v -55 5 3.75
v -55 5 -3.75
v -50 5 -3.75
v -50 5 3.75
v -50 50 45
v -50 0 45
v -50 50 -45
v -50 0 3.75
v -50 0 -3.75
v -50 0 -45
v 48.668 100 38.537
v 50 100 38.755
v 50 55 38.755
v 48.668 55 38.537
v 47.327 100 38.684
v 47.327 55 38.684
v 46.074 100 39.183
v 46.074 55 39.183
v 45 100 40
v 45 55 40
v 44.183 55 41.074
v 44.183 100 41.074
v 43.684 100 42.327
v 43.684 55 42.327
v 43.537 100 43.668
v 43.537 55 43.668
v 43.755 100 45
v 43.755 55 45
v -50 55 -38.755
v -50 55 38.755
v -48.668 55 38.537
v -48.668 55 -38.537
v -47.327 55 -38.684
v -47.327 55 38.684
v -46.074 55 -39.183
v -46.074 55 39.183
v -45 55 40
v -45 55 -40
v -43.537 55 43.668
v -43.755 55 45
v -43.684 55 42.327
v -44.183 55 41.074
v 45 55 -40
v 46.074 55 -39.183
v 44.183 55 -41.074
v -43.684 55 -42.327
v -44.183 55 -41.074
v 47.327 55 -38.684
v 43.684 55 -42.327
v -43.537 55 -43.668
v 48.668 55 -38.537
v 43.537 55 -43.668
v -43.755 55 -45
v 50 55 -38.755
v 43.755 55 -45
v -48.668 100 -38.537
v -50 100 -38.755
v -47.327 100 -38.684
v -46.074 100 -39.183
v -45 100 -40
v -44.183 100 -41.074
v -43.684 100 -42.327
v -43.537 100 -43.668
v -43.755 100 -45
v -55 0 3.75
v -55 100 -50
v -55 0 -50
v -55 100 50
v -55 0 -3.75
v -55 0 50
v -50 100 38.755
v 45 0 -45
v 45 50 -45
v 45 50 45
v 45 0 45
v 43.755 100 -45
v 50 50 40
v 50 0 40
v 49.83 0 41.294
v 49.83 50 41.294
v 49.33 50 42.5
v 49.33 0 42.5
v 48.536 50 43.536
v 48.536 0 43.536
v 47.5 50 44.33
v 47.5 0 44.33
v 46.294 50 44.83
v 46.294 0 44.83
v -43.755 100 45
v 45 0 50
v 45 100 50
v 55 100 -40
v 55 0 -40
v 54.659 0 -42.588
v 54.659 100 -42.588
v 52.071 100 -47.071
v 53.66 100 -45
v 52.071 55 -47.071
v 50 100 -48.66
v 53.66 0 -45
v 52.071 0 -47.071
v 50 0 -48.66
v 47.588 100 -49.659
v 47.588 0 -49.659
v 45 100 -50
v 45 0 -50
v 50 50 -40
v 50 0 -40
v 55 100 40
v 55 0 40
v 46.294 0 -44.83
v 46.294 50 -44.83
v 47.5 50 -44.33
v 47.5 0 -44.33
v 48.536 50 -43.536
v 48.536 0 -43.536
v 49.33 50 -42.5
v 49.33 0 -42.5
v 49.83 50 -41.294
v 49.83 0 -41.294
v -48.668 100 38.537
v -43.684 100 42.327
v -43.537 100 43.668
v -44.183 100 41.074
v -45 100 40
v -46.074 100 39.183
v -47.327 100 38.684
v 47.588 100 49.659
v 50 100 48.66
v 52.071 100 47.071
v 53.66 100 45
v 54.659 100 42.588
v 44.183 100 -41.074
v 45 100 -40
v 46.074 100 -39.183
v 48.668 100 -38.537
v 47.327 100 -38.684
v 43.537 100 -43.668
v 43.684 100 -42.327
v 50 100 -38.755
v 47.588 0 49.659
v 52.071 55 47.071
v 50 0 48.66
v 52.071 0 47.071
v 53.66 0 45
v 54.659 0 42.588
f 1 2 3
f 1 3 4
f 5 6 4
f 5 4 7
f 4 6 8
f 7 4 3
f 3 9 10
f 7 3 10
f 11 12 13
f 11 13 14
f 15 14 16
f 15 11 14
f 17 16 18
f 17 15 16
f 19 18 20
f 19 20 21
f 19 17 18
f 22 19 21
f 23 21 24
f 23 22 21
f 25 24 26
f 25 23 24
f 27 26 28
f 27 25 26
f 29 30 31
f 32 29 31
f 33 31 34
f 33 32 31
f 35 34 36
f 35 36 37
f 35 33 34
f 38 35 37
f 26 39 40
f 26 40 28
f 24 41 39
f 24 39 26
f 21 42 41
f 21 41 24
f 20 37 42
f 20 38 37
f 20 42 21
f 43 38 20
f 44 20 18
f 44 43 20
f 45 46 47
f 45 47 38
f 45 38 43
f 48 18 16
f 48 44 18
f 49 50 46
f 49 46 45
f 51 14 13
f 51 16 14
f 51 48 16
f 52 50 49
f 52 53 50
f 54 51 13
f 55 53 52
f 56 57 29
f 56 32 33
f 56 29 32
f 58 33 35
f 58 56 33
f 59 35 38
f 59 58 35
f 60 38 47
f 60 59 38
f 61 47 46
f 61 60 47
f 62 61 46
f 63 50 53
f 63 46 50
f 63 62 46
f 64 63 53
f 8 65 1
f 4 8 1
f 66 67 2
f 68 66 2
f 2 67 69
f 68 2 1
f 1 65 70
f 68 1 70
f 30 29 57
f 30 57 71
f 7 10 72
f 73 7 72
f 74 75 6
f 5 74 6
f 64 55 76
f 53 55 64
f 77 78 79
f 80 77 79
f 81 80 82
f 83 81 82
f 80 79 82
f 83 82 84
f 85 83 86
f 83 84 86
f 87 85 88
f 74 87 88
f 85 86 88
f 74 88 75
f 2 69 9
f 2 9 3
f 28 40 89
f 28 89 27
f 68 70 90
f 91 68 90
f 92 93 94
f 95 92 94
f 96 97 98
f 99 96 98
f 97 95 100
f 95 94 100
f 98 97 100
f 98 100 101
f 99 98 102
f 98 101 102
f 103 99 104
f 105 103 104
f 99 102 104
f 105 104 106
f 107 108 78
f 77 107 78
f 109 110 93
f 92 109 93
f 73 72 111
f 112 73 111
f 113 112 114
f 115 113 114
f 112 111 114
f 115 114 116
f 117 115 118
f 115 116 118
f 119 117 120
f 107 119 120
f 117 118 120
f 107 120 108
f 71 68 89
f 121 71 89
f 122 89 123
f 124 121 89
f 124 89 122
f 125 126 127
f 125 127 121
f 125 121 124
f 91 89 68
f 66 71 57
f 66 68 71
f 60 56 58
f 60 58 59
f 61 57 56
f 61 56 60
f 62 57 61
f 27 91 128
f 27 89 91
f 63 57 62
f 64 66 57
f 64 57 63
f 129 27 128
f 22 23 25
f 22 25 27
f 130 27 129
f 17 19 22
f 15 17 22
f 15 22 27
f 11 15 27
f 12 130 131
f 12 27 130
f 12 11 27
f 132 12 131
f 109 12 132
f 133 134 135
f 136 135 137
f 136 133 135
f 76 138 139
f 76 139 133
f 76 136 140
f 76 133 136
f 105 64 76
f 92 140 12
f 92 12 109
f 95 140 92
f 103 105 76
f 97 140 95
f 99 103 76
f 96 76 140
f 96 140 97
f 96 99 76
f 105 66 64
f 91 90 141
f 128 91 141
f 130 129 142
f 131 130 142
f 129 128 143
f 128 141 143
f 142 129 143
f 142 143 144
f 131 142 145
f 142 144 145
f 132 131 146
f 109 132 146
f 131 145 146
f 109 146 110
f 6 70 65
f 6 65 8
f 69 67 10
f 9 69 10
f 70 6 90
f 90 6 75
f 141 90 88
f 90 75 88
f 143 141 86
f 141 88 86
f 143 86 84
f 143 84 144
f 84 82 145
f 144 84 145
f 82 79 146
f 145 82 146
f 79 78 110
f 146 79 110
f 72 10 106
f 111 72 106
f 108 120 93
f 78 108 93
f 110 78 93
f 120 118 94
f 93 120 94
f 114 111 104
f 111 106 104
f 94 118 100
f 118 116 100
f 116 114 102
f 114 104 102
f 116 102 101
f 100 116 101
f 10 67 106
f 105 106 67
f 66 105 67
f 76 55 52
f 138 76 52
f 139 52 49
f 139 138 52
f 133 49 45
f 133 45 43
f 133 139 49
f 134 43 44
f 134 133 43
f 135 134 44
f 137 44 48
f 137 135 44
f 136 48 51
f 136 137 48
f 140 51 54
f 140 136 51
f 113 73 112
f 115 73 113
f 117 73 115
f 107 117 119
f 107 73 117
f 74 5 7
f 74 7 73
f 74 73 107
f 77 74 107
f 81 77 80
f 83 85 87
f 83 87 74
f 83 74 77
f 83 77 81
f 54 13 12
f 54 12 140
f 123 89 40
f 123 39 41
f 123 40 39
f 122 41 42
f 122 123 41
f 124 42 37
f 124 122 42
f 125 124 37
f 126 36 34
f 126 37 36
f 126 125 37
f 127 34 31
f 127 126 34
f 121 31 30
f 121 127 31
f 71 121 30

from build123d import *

# Parameters (mm, degrees)
BOSS_EXTRUDE1_DEPTH = 100
CUT_EXTRUDE1_DEPTH  = 50
CUT_EXTRUDE2_START  = -45
CUT_EXTRUDE2_DEPTH  = 45
SKETCH4_R           = 5
BOSS_EXTRUDE2_DEPTH = 45
SKETCH5_W           = 7.5
SKETCH5_H           = 5
CUT_EXTRUDE4_DEPTH  = 5


with BuildPart() as part:
    # Sketch1 → Boss-Extrude1 (new body)
    with BuildSketch(Plane(origin=(0, 0, 0), x_dir=(1, 0, 0), z_dir=(0, 1, 0))):
        with BuildLine():
            Line((-55, -50), (45, -50))
            ThreePointArc((45, -50), (52.071067812, -47.071067812), (55, -40))
            Line((55, -40), (55, 40))
            ThreePointArc((55, 40), (52.071067812, 47.071067812), (45, 50))
            Line((45, 50), (-55, 50))
            Line((-55, 50), (-55, -50))
        make_face()
    extrude(amount=BOSS_EXTRUDE1_DEPTH)

    # Sketch2 → Cut-Extrude1 (cut)
    with BuildSketch(Plane.XZ):
        with BuildLine():
            Line((-50, 45), (-50, -45))
            Line((-50, -45), (45, -45))
            ThreePointArc((45, -45), (48.535533906, -43.535533906), (50, -40))
            Line((50, -40), (50, 40))
            ThreePointArc((50, 40), (48.535533906, 43.535533906), (45, 45))
            Line((45, 45), (-50, 45))
        make_face()
    extrude(amount=-CUT_EXTRUDE1_DEPTH, mode=Mode.SUBTRACT)

    # Sketch3 → Cut-Extrude2 (cut)
    with BuildSketch(Plane(origin=(0, 100, 0), x_dir=(1, 0, 0), z_dir=(0, 1, 0)).offset(CUT_EXTRUDE2_START)):
        with BuildLine():
            Line((-50, 45), (-50, -45))
            Line((-50, -45), (45, -45))
            ThreePointArc((45, -45), (48.535533906, -43.535533906), (50, -40))
            Line((50, -40), (50, 40))
            ThreePointArc((50, 40), (48.535533906, 43.535533906), (45, 45))
            Line((45, 45), (-50, 45))
        make_face()
    extrude(amount=CUT_EXTRUDE2_DEPTH, mode=Mode.SUBTRACT)

    # Sketch4 → Boss-Extrude2 (add)
    with BuildSketch(Plane(origin=(0, 100, 0), x_dir=(1, 0, 0), z_dir=(0, 1, 0))):
        with Locations((48.535533906, -43.535533906)):
            Circle(SKETCH4_R)
        with Locations((48.535533906, 43.535533906)):
            Circle(SKETCH4_R)
        with Locations((-48.535533906, -43.535533906)):
            Circle(SKETCH4_R)
        with Locations((-48.535533906, 43.535533906)):
            Circle(SKETCH4_R)
    extrude(amount=-BOSS_EXTRUDE2_DEPTH)

    # Sketch5 → Cut-Extrude4 (cut)
    with BuildSketch(Plane.ZY.offset(55)):
        with Locations((0, 2.5)):
            Rectangle(SKETCH5_W, SKETCH5_H)
    extrude(amount=-CUT_EXTRUDE4_DEPTH, mode=Mode.SUBTRACT)


solid = part.part
